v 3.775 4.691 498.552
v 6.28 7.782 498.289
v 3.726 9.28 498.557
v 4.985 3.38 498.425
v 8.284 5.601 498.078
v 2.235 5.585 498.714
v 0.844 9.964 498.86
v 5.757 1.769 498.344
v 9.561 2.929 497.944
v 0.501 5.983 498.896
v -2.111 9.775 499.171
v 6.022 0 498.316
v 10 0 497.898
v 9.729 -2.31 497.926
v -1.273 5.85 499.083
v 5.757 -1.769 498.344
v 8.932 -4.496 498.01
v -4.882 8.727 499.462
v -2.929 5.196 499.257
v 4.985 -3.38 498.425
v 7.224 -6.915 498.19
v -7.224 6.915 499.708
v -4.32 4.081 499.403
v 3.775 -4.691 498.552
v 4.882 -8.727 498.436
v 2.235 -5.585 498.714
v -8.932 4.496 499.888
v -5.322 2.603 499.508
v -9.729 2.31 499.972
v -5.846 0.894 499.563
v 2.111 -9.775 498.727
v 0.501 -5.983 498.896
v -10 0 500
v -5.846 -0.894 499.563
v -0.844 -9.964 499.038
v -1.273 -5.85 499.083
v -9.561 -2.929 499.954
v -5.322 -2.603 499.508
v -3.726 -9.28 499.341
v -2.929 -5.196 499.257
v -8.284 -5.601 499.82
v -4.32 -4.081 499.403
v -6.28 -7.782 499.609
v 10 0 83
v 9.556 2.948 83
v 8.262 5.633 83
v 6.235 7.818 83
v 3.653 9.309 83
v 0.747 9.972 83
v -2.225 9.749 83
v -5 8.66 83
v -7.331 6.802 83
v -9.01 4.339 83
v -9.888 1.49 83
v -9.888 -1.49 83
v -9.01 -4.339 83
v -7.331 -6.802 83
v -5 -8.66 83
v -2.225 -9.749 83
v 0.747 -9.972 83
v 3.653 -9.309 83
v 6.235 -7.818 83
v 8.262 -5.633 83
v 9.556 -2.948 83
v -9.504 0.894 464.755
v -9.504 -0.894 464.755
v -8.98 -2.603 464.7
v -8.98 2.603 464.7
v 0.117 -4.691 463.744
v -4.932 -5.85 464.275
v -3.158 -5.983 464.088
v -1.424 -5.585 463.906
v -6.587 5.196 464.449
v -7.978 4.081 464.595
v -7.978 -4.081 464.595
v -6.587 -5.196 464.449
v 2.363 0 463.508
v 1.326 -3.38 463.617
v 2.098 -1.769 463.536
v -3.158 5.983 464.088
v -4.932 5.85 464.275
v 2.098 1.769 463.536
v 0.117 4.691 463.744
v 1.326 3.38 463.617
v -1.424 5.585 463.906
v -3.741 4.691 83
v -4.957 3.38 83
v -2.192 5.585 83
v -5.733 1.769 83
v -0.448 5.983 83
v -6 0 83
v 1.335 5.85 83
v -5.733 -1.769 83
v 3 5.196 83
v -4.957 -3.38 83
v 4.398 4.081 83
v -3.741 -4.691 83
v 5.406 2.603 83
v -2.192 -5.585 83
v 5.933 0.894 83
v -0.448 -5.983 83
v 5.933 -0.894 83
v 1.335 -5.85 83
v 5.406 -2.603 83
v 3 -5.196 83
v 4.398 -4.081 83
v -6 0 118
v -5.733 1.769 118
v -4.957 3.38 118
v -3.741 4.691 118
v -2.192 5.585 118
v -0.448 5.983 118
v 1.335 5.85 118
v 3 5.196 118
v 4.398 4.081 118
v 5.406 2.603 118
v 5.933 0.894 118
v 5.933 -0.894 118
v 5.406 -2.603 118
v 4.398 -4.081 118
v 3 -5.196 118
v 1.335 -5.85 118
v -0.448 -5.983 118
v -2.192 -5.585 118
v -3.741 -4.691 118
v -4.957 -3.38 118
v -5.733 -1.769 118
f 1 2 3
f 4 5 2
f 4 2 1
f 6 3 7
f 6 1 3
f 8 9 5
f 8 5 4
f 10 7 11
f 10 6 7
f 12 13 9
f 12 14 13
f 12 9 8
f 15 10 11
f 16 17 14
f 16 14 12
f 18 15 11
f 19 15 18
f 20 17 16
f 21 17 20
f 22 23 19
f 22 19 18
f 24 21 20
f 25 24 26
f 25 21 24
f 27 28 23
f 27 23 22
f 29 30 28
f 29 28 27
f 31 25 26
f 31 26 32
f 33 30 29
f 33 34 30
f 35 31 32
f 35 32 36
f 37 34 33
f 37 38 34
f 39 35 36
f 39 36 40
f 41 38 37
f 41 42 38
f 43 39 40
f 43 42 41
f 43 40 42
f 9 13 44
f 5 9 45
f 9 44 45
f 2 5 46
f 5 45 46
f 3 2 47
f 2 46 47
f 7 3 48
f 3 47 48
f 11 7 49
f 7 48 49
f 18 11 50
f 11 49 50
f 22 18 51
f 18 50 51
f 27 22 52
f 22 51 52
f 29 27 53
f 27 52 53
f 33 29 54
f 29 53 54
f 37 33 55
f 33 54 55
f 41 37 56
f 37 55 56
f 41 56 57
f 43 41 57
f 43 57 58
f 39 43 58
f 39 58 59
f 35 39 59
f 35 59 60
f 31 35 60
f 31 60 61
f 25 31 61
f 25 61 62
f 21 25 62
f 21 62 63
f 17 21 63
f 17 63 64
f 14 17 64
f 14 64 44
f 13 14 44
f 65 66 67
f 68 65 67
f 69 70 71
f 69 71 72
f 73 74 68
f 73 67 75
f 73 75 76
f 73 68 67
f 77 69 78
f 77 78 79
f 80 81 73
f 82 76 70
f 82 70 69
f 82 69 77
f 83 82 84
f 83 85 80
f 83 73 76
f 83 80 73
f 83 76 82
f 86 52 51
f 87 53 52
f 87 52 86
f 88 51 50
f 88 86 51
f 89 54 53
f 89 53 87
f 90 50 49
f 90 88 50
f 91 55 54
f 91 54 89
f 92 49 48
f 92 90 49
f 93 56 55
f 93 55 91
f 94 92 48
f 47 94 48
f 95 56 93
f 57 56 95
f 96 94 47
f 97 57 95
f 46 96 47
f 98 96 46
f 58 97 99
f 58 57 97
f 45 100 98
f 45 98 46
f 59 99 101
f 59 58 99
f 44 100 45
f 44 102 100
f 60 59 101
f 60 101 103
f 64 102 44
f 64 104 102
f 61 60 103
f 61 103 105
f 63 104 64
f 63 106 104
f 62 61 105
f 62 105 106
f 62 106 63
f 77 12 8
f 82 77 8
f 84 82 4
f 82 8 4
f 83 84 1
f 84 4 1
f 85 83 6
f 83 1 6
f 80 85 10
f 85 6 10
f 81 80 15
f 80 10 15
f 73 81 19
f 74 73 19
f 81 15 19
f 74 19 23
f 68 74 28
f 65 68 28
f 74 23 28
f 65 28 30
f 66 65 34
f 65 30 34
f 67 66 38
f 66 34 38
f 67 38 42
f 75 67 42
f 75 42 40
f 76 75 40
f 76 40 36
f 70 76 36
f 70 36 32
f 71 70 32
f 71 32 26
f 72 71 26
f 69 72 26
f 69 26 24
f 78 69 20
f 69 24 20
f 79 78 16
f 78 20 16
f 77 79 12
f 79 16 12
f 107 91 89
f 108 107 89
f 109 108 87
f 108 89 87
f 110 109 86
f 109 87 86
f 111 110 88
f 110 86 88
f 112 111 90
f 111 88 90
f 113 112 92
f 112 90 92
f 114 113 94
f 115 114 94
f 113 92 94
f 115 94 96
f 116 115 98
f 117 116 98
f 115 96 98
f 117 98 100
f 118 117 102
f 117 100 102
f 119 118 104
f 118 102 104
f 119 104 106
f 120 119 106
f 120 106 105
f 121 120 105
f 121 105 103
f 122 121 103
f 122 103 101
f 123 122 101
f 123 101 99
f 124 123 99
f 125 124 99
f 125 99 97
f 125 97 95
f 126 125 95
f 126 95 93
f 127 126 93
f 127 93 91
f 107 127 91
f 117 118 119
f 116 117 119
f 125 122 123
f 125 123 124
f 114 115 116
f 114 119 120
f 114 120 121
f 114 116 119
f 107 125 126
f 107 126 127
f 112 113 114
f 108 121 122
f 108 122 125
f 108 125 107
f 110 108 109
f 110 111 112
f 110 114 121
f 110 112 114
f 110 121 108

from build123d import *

# Parameters (mm, degrees)
SZKIC1_R                        = 10
DODANIE_WYCI_GNI_CIE1_DEPTH     = 500
SZKIC2_R                        = 6
WYTNIJ_WYCI_GNI_CIE1_DEPTH      = 118
WYTNIJ_WYCI_GNI_CIE2_DEPTH      = 35
WYTNIJ_WYCI_GNI_CIE2_DEPTH_BACK = 35
SZKIC4_R                        = 6
WYTNIJ_WYCI_GNI_CIE3_DEPTH      = 35
WYTNIJ_WYCI_GNI_CIE4_DEPTH      = 20
WYTNIJ_WYCI_GNI_CIE4_DEPTH_BACK = 20
SZKIC5_W                        = 20
SZKIC5_H                        = 83


with BuildPart() as part:
    # Szkic1 → Dodanie-wyciągnięcie1 (new body)
    with BuildSketch(Plane.XY):
        Circle(SZKIC1_R)
    extrude(amount=DODANIE_WYCI_GNI_CIE1_DEPTH)

    # Szkic2 → Wytnij-wyciągnięcie1 (cut)
    with BuildSketch(Plane(origin=(0, 0, 0), x_dir=(-1, 0, 0), z_dir=(0, 0, -1))):
        Circle(SZKIC2_R)
    extrude(amount=-WYTNIJ_WYCI_GNI_CIE1_DEPTH, mode=Mode.SUBTRACT)

    # Szkic3 → Wytnij-wyciągnięcie2 (cut, two sides: drawn at the far end of the back side and taken through both)
    with BuildSketch(Plane(origin=(0, 0, 0), x_dir=(1, 0, 0), z_dir=(0, 1, 0)).offset(-WYTNIJ_WYCI_GNI_CIE2_DEPTH_BACK)):
        Polygon((-10, -500), (10, -500), (15.054630998, -497.366652169), align=None)
    extrude(amount=WYTNIJ_WYCI_GNI_CIE2_DEPTH + WYTNIJ_WYCI_GNI_CIE2_DEPTH_BACK, mode=Mode.SUBTRACT)

    # Szkic4 → Wytnij-wyciągnięcie3 (cut)
    with BuildSketch(Plane(origin=(51.868660708, 0, 493.497341729), x_dir=(0.9945218953682733, 0, -0.10452846326765462), z_dir=(0.10452846326765461, 0, 0.9945218953682732))):
        with Locations((-52.099435871, 0)):
            Circle(SZKIC4_R)
    extrude(amount=-WYTNIJ_WYCI_GNI_CIE3_DEPTH, mode=Mode.SUBTRACT)

    # Szkic5 → Wytnij-wyciągnięcie4 (cut, two sides: drawn at the far end of the back side and taken through both)
    with BuildSketch(Plane(origin=(0, 0, 0), x_dir=(1, 0, 0), z_dir=(0, 1, 0)).offset(-WYTNIJ_WYCI_GNI_CIE4_DEPTH_BACK)):
        with Locations((0, -41.5)):
            Rectangle(SZKIC5_W, SZKIC5_H)
    extrude(amount=WYTNIJ_WYCI_GNI_CIE4_DEPTH + WYTNIJ_WYCI_GNI_CIE4_DEPTH_BACK, mode=Mode.SUBTRACT)


solid = part.part
